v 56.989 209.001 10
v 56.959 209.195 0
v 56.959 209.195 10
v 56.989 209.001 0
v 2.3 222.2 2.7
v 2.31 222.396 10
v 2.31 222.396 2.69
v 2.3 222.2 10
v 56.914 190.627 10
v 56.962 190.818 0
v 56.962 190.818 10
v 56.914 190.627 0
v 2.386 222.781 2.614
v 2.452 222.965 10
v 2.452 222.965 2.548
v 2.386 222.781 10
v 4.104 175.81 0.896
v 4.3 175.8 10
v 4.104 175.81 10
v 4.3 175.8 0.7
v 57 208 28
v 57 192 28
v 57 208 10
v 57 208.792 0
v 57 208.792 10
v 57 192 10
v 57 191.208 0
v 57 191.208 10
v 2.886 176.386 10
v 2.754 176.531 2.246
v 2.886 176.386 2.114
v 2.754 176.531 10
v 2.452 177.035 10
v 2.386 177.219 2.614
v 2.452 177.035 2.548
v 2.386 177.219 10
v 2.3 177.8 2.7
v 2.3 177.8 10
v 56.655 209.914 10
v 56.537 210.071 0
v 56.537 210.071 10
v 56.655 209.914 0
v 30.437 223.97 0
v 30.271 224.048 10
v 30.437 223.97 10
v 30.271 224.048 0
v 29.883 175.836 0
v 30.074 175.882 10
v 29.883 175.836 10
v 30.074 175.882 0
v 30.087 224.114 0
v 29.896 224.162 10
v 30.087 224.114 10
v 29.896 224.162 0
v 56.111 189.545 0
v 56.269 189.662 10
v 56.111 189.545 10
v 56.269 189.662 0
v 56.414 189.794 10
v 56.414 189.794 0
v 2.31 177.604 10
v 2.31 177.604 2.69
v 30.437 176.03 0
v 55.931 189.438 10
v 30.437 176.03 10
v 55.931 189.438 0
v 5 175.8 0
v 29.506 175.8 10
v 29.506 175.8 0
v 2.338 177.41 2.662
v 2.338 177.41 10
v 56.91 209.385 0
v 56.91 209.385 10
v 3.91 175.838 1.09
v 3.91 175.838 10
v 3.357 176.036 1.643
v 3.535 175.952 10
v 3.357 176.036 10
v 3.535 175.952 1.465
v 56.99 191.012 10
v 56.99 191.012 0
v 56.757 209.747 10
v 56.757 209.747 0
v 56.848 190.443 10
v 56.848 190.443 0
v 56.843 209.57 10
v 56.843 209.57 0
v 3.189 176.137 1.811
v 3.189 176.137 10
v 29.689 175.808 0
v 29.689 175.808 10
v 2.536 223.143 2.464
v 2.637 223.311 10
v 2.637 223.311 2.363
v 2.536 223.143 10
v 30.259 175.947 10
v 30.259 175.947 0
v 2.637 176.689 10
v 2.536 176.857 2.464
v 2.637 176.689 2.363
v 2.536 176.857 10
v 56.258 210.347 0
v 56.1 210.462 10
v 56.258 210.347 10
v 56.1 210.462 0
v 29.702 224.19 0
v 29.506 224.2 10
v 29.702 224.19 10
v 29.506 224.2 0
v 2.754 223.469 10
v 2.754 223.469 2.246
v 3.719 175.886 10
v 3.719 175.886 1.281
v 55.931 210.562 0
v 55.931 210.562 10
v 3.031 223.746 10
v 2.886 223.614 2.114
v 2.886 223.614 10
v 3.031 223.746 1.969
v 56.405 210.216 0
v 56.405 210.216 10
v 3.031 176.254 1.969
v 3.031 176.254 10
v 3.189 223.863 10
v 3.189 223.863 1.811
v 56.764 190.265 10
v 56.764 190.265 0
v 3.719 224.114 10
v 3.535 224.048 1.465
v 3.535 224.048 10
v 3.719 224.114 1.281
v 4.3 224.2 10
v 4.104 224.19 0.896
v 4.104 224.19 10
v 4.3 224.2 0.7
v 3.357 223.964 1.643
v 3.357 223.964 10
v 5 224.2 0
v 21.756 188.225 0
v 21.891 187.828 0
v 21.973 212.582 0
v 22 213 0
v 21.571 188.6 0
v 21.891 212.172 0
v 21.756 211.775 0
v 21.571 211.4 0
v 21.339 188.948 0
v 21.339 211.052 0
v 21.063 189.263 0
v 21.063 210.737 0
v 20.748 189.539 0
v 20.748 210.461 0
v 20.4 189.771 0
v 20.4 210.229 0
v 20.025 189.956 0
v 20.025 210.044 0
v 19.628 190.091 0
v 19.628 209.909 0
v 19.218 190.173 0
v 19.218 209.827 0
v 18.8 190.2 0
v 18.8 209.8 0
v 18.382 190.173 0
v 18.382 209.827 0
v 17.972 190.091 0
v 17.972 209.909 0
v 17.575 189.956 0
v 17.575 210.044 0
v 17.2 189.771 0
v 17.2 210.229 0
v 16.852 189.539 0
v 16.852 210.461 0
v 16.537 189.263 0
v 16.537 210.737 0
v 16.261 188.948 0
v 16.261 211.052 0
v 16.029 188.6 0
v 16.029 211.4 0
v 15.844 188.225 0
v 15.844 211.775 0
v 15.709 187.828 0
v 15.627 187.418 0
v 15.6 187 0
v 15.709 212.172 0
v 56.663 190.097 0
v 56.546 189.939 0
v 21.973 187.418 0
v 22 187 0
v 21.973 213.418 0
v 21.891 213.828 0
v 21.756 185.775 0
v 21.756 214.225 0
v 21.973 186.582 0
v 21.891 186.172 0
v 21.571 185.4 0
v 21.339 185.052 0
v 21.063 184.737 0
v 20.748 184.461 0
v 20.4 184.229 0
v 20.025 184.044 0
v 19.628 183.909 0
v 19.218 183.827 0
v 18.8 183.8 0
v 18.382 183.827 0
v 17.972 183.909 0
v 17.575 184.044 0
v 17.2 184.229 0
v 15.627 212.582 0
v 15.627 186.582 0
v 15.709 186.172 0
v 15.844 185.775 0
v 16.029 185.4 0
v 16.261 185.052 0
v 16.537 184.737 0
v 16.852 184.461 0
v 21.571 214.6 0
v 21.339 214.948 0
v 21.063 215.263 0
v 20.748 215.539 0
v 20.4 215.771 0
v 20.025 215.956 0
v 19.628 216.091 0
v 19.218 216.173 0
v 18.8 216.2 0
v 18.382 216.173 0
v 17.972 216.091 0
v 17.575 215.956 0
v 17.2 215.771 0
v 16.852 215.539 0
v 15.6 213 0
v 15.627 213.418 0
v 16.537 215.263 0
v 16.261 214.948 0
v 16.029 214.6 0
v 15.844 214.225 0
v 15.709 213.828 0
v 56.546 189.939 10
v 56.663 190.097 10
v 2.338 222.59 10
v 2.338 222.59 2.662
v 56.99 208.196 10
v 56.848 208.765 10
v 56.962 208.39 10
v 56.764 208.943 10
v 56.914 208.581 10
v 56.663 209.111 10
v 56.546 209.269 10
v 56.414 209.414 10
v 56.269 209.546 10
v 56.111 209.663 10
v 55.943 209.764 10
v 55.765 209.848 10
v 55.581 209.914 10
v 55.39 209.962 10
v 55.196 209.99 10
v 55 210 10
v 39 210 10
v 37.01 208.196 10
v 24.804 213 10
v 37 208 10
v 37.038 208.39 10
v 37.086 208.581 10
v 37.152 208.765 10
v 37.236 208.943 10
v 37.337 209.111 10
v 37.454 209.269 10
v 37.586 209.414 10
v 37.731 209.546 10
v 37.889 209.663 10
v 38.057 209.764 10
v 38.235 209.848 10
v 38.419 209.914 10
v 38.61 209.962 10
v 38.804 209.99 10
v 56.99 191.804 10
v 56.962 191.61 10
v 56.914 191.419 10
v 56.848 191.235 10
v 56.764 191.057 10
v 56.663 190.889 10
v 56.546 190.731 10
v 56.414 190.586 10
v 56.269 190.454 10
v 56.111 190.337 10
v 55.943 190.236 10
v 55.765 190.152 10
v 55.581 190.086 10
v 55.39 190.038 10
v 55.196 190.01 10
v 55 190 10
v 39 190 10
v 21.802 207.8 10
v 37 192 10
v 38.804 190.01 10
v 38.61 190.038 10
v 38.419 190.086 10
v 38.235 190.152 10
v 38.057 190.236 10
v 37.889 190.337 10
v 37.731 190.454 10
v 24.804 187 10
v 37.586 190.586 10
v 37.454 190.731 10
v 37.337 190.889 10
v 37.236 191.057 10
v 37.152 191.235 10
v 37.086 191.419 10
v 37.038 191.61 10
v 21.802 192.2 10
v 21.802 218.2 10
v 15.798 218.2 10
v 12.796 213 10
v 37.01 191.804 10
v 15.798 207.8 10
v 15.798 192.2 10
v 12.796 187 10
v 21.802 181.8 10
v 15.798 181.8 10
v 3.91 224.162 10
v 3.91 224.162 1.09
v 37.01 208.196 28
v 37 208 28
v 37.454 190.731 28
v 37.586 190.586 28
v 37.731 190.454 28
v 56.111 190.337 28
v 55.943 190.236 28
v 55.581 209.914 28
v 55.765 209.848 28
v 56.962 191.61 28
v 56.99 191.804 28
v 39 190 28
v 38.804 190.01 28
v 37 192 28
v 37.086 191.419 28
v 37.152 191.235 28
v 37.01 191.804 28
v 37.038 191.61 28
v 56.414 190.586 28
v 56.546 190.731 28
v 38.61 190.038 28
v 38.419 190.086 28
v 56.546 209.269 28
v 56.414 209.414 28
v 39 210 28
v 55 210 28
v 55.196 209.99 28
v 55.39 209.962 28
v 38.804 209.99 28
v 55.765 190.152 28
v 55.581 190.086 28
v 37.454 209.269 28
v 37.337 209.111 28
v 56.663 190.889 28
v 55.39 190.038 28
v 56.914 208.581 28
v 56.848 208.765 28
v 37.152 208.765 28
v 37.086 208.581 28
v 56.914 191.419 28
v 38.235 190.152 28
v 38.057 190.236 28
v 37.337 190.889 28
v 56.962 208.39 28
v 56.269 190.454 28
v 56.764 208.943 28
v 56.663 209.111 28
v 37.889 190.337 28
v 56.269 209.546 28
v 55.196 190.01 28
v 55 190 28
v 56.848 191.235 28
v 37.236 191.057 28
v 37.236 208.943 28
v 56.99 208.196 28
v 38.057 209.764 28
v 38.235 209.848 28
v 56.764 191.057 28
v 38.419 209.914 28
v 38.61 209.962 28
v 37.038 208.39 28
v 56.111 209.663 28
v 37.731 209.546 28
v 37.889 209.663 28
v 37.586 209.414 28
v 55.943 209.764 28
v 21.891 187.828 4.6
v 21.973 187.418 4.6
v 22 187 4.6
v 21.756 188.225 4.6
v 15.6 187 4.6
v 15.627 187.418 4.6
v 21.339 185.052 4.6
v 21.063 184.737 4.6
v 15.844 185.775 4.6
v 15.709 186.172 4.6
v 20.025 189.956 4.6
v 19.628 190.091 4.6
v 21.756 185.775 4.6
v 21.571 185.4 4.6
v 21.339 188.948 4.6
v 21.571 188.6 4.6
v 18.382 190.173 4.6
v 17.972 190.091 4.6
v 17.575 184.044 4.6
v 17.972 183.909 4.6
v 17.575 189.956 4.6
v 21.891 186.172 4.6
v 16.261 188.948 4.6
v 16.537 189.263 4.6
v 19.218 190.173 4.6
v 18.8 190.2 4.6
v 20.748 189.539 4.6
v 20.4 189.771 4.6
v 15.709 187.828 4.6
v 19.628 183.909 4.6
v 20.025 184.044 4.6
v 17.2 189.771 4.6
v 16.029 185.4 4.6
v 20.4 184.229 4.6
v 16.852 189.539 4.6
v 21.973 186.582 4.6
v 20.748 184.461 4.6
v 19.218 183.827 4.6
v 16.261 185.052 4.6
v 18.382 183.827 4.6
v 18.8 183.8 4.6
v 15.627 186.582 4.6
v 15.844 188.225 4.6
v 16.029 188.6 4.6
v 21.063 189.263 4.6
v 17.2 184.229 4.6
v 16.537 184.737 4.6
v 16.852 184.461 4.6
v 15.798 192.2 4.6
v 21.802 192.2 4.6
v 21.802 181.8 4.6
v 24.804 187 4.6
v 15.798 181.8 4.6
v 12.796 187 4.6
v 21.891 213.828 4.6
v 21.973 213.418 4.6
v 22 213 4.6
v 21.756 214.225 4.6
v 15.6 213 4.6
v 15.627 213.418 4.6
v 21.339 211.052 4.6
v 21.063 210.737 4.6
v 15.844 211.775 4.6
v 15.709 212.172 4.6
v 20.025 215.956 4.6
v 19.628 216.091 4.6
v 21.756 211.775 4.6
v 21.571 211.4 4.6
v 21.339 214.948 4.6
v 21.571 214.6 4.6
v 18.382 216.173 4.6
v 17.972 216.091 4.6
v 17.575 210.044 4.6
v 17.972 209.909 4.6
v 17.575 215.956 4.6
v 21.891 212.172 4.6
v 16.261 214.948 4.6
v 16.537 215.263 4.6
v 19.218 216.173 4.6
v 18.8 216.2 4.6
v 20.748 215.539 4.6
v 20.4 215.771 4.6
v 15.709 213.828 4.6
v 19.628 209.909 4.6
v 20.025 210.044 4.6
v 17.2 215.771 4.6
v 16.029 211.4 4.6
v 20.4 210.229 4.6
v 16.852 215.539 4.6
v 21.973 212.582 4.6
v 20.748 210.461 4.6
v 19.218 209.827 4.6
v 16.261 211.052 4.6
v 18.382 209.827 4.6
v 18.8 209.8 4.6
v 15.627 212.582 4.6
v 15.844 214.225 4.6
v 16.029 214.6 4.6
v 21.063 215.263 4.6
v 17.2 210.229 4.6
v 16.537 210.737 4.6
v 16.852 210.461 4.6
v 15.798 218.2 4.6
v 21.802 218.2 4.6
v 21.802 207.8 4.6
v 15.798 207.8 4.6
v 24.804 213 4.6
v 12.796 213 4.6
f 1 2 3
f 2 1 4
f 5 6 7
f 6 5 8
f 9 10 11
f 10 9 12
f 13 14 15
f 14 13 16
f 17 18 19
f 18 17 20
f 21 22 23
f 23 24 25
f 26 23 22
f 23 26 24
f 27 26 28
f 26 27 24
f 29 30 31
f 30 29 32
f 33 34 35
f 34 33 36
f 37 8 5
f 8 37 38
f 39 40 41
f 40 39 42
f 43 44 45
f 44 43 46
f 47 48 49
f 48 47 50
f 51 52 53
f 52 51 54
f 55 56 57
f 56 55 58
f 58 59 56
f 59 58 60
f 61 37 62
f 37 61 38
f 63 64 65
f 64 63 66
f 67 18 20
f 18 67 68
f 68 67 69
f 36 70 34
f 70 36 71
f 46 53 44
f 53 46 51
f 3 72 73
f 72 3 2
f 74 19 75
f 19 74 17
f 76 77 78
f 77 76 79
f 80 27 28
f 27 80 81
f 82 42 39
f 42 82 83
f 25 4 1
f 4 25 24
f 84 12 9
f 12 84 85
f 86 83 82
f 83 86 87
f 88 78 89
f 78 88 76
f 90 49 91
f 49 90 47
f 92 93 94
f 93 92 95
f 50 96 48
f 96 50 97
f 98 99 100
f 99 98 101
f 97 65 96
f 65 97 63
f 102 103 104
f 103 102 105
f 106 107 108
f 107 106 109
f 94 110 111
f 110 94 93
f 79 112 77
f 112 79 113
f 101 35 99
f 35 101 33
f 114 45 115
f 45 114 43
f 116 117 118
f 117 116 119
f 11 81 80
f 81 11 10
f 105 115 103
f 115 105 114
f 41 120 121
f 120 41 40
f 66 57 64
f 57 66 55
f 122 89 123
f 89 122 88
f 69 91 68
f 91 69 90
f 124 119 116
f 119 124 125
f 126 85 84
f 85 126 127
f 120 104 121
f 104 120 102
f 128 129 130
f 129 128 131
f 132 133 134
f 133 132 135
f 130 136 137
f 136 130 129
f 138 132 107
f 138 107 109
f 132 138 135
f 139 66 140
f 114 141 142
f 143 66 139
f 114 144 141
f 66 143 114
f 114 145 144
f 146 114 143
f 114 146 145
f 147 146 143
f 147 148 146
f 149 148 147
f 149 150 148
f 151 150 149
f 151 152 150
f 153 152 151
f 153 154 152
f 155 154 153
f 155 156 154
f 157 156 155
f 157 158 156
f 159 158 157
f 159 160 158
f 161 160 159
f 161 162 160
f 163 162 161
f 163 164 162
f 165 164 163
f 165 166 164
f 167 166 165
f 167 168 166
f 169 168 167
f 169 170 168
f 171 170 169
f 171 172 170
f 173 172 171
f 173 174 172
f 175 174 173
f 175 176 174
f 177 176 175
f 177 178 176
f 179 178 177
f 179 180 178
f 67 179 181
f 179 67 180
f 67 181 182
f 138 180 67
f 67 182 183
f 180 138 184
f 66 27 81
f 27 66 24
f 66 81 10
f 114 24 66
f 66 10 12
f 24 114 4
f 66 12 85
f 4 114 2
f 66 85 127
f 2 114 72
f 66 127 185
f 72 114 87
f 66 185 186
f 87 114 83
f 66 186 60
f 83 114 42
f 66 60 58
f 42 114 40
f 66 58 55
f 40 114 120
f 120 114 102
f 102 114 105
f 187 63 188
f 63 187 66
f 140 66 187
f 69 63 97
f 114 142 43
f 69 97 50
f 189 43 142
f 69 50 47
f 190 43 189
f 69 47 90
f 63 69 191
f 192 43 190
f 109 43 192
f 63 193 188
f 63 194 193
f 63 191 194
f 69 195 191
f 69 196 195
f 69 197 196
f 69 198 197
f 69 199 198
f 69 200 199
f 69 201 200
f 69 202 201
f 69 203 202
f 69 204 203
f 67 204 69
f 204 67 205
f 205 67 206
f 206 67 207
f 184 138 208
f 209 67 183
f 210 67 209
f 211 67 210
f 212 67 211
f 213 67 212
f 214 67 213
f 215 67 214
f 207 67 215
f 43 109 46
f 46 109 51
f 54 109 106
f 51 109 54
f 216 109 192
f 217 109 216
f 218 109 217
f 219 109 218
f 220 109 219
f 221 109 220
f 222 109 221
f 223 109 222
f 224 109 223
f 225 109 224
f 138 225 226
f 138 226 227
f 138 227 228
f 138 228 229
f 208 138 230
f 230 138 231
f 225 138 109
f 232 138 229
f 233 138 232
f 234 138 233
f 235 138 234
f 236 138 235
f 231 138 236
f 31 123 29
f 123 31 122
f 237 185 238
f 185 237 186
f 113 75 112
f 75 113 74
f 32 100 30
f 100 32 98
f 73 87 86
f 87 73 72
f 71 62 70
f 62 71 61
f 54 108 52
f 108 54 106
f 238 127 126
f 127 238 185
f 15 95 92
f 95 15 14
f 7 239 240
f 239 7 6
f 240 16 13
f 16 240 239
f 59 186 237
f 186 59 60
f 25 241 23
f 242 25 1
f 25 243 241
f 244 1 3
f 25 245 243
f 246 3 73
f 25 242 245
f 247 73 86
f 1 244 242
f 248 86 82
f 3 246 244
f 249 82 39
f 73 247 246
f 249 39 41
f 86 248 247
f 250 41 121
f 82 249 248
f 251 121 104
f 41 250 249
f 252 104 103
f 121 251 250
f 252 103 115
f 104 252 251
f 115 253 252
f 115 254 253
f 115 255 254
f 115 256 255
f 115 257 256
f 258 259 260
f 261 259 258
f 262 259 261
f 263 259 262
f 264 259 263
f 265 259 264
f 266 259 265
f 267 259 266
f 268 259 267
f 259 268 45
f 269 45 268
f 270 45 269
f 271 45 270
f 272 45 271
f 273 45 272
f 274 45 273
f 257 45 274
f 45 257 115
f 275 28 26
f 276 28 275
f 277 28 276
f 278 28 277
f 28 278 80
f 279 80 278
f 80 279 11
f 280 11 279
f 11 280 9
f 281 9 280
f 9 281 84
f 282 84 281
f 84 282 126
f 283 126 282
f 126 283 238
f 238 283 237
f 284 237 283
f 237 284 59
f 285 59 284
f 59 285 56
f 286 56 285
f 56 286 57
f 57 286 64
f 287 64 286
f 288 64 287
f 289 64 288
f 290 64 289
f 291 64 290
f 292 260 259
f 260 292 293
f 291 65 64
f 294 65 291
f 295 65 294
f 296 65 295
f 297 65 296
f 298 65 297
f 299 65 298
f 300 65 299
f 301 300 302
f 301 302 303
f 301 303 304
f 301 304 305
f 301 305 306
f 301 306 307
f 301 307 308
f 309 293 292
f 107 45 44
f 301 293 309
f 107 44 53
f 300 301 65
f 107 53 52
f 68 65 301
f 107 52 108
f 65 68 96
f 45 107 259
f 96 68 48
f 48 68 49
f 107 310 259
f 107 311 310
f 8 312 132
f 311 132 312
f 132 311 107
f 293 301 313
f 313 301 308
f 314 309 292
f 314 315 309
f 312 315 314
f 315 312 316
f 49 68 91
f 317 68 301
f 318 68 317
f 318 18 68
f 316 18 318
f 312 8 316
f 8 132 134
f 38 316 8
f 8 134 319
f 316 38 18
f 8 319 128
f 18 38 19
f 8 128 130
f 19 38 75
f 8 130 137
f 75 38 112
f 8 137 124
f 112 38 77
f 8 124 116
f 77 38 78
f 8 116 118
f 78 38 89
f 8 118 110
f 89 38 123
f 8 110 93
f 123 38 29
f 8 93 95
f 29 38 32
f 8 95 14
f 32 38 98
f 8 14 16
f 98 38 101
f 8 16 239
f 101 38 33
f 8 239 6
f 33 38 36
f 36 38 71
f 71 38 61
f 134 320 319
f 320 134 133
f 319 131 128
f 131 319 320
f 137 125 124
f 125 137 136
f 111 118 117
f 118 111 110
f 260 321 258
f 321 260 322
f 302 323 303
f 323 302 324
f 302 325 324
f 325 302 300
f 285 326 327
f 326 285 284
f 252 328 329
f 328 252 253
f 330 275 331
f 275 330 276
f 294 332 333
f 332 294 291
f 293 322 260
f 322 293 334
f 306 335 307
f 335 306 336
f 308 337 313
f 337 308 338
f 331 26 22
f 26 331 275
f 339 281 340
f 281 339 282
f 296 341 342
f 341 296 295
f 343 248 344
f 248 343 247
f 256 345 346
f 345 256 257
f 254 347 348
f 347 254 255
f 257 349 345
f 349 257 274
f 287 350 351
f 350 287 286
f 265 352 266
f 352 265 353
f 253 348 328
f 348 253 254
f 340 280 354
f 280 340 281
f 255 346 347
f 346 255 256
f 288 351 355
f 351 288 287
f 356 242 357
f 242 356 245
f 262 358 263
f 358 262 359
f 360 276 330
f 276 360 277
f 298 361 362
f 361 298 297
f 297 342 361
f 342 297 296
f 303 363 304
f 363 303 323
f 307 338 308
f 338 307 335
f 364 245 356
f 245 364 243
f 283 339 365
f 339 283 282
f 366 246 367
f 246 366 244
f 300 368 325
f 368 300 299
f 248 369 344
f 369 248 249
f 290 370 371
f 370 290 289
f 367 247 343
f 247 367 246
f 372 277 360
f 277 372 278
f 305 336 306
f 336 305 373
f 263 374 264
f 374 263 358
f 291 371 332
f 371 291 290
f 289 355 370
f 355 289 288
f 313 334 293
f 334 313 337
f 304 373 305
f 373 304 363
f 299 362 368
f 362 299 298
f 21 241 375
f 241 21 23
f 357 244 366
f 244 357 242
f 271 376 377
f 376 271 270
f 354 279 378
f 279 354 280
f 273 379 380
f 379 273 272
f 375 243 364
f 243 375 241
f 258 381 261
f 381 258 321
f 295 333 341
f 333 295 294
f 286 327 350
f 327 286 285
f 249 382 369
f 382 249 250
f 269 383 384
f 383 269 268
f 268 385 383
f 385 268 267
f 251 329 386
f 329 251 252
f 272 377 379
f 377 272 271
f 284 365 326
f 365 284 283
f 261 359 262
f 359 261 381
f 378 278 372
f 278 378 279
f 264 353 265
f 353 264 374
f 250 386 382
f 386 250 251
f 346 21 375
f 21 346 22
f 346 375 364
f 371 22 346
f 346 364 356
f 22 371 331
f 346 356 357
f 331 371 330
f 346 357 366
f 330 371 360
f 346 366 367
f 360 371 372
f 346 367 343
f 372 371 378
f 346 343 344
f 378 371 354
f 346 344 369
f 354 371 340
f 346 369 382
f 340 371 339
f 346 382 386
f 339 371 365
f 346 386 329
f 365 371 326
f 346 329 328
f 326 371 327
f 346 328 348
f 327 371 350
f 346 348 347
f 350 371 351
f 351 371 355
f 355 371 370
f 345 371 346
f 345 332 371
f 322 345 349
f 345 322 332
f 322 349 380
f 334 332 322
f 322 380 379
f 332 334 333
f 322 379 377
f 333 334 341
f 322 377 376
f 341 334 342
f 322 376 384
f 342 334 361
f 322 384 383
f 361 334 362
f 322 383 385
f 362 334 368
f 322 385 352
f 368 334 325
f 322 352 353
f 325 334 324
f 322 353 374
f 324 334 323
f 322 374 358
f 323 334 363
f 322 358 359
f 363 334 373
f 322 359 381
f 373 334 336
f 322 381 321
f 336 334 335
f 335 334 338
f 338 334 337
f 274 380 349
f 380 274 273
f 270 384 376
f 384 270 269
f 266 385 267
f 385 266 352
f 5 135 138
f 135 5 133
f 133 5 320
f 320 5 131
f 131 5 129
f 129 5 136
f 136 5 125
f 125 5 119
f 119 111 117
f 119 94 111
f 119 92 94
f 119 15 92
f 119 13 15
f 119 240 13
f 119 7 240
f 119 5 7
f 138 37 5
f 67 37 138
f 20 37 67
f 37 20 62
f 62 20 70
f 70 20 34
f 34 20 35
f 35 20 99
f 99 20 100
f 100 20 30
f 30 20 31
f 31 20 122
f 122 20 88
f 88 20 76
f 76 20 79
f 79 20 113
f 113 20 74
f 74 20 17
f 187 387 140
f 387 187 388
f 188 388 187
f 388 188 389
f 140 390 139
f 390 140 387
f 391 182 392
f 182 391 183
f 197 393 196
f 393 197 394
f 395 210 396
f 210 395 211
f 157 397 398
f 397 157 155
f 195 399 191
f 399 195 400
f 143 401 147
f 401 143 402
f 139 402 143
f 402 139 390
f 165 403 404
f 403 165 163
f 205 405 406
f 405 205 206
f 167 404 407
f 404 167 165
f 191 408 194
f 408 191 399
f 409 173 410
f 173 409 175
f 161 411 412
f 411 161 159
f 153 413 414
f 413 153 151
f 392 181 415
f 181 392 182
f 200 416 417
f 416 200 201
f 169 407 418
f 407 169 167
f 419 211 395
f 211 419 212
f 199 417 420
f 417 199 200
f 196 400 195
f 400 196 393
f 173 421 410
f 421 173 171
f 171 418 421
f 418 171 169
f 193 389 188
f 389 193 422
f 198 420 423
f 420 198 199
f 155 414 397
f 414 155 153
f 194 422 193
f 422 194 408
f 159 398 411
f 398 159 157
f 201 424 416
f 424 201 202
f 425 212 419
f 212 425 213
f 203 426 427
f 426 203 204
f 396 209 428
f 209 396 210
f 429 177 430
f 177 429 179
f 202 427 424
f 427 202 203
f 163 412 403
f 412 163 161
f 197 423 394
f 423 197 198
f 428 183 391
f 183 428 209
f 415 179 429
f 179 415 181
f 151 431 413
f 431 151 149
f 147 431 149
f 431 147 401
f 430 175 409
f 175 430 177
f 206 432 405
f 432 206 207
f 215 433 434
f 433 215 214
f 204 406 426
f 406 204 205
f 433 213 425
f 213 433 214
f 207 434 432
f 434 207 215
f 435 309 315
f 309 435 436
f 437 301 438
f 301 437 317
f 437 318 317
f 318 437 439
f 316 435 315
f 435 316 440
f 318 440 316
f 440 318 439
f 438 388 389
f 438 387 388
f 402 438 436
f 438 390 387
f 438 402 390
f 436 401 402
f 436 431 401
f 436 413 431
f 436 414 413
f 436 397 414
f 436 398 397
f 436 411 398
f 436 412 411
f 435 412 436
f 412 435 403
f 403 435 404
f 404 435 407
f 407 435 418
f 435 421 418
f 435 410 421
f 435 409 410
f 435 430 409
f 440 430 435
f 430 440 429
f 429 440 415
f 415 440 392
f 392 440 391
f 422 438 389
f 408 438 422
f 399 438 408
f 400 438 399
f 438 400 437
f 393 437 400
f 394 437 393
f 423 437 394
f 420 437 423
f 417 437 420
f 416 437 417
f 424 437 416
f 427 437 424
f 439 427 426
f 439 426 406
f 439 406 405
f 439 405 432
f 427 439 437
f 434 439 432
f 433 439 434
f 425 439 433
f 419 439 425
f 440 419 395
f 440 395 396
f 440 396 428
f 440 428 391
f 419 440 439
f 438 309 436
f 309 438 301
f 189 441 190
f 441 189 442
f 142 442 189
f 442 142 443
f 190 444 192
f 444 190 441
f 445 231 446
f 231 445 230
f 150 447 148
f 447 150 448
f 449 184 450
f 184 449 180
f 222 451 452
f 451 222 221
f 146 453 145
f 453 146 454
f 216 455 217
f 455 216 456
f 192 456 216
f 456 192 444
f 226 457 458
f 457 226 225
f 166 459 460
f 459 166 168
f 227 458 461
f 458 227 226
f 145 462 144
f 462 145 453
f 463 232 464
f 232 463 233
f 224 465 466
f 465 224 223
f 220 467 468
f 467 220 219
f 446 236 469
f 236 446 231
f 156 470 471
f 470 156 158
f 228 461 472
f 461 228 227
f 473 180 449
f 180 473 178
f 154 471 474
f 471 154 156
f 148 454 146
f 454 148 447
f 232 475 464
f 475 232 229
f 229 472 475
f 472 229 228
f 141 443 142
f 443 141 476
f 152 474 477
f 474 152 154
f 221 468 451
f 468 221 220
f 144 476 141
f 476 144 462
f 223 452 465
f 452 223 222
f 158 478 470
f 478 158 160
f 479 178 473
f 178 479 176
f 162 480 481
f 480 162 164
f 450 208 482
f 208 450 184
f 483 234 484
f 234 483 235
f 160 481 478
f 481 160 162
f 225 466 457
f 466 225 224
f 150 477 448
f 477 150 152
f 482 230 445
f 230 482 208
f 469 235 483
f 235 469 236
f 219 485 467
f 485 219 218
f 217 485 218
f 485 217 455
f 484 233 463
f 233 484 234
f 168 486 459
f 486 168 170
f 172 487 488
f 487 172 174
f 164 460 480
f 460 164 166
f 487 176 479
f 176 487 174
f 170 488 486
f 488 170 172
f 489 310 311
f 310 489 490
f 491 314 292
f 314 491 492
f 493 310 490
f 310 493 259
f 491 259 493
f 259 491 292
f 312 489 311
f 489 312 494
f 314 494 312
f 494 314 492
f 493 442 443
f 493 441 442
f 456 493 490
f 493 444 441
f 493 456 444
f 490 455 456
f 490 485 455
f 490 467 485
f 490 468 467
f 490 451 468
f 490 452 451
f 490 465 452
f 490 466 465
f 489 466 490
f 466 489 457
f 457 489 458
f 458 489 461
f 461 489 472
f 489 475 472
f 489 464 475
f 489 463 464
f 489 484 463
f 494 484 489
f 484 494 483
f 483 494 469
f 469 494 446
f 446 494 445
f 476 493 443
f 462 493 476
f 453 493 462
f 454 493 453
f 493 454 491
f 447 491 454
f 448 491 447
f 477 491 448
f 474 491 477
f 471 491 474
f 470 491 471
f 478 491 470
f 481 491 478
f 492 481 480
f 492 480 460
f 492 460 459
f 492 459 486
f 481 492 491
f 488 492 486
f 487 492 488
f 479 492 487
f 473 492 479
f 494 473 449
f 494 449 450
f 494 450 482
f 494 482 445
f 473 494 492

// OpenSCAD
// file: ../../../../modules/steel_rack.scad
use <bolts.scad>;

bolt_edge_offset = 15;
bolt_positions = [
  bolt_edge_offset,
  bolt_edge_offset + 98,
  bolt_edge_offset + 98 + 24,
];

module bolt_and_nut(y, h) {
  nut_thickness = 5;
  translate([0, y, h / 2])
    m6_bolt_hole(h + 1, center = true);
  translate([0, y, h - nut_thickness / 2])
    rotate([0, 0, 90])
    m6_nut_trap(nut_thickness, center = true);
}

module long_bar(w, y, h) {
  difference() {
    translate([w / 2, y / 2, h / 2])
      cube([w, y, h], center = true);

    for (x = bolt_positions) {
      translate([x, 0, 0])
        bolt_and_nut(y / 2, h);
    }
  }
}

module short_bar(w, y, h) {
  difference() {
    translate([w / 2, y / 2, h / 2])
      cube([w, y, h], center = true);

    translate([bolt_positions[0], 0, 0])
      bolt_and_nut(y / 2, h);
  }
}

module fillet_profile(r, h) {
  linear_extrude(height = h, center = true)
    difference() {
      square([r, r]);
      circle(r = r, $fn = 64);
    }
}
// file: ../../../../modules/slide_rail_outer_bracket.scad
use <bolts.scad>
use <steel_rack.scad>

// スライドレール外側とL字アングルを接合するL字ブラケット。
// 設計の経緯と確定値は ledger/designs/steel-rack-500x400.md が正本。
//
// 座標系 (部品自身の datum):
//   X = 0 がこの部品側のL字アングル外側面。部品はアングル板厚の内側から始まる
//   Y = 0 がスライドレール外側面。+Y がラック外側
//   Z = 0 が部品底面 (レール下端と一致)
// front は screw_x = [37, 101.5]、rear は [79.5, 176] を自分の datum
// から渡す。 M6 が高さ 22.5±12 の対称配置のため部品は Z 反転対称になり、
// 左右のレールにも上下反転するだけで同じ2部品を使い回せる。

bracket_height = 45;
flange_t = 10; // 短辺 (X方向厚) の厚さ
// 長辺 (Y方向厚) の厚さ。旧断面は flange_t=10 を共用していたが、レール面を
// rail_offset 分外へ出すと M6 ナット挿入口が長辺と重なるため 2mm 削った
// (10→8、user決定)。ナット六角の内縁 (y=8.000) と長辺外面がツライチになる
arm_t = 8;
// レール接触面のラック外側オフセット。組付け実測でレール間隔が 385mm しか
// なくケース 412mm が入らないため、(412 - 385) / 2 + 0.5 = 14mm ずつ
// 各レールを外側へ移す (user指示)。M6 実穴は既に開いており位置を変えられない
rail_offset = 14;
inner_r = 4;
m6_z = [ 10.5, 34.5 ];
// クリアランス基準: 呼び寸法 + 0.4mm (実プリントの嵌合結果から拡大)
m6_pass_flat = 6.4; // M6ボルト通し六角の二面幅 (手前5mm)
m6_nut_flat = 10.4; // M6ナット窪み六角の二面幅 (奥5mm、ナット実測9.8 + 実効0.6)
m6_stage_depth = 5;
screw_z = 22.5;
m4_pass_flat = 4.4; // M4小トラスネジ通し六角の二面幅
m4_nut_flat = 7.4; // M4ナット窪み六角の二面幅 (ナット実測6.8 + 実効0.6)
m4_nut_depth = 2.8; // M4ナット窪みの深さ (user指定)
edge_margin = 8; // 穴の外縁から部品端までの余白 (自由な辺のみ)
angle_t = 2.2; // L字アングルの板厚

// 六角プリズム: 軸X・上下の辺が水平 (flat-up)。
// 天井を短い水平ブリッジにして垂れの改善を狙う
// (point-up だと天井面が水平から30°になり垂れた — 嵌合試験で確認済み)
module
hex_x_flat_up(flat_d, l)
{
    rotate([ 0, 90, 0 ]) rotate([ 0, 0, 90 ]) hex_hole(flat_d = flat_d, h = l);
}

// 六角プリズム: 軸Y・上下の辺が水平 (flat-up)。M6と同じくブリッジ天井
module
hex_y_flat_up(flat_d, l)
{
    rotate([ 90, 0, 0 ]) hex_hole(flat_d = flat_d, h = l);
}

module
slide_rail_outer_bracket(screw_x, name = "bracket")
{
    // flat-up配置では水平方向の穴半径は対角/2 (= 二面幅/(2*cos30))。
    // 8mm余白の契約はこの実半径に対して守る
    m6_nut_diag = m6_nut_flat / cos(30);
    m4_nut_diag = m4_nut_flat / cos(30);
    // M6中心: 実物のアングルには旧断面 (長辺厚10) の導出値
    // (厚10 + 内側R + 余白 + M6六角対角/2 = 28.0044) で既に穴が開いている。
    // 旧導出式から rail_offset を引くことで M6 実穴と部品外端の絶対位置を
    // 保ったまま、レール接触面 (y=0) だけをラック外側へ 14mm 出す
    m6_y = flange_t + inner_r + edge_margin + m6_nut_diag / 2 - rail_offset;
    short_len = m6_y + m6_nut_diag / 2 + edge_margin;
    // 長辺のX終端: 最奥のM4穴の最大断面 (ナット窪みの対角の半分) + 余白
    arm_end = max(screw_x) + m4_nut_diag / 2 + edge_margin;

    echo(str("CONTRACT ", name, ": height = ", bracket_height));
    echo(str("CONTRACT ", name, ": flange_t = ", flange_t));
    echo(str("CONTRACT ", name, ": arm_t = ", arm_t));
    echo(str("CONTRACT ", name, ": rail_offset = ", rail_offset));
    echo(str("CONTRACT ", name, ": inner_r = ", inner_r));
    echo(str("CONTRACT ", name, ": m6_z = ", m6_z));
    echo(str("CONTRACT ", name, ": m6_pass_flat = ", m6_pass_flat));
    echo(str("CONTRACT ", name, ": m6_nut_flat = ", m6_nut_flat));
    echo(str("CONTRACT ", name, ": screw_z = ", screw_z));
    echo(str("CONTRACT ", name, ": m4_pass_flat = ", m4_pass_flat));
    echo(str("CONTRACT ", name, ": m4_nut_flat = ", m4_nut_flat));
    echo(str("CONTRACT ", name, ": m4_nut_depth = ", m4_nut_depth));
    echo(str("CONTRACT ", name, ": edge_margin = ", edge_margin));
    echo(str("CONTRACT ", name, ": angle_t = ", angle_t));
    echo(str("CONTRACT ", name, ": screw_x = ", screw_x));
    echo(str("CONTRACT ",
             name,
             ": m6_y = ",
             m6_y,
             ", short_len = ",
             short_len,
             ", arm_end = ",
             arm_end));

    // 余白の契約 (自由な辺のみ。高さ45とM6のZはuser固定値なので対象外)。
    // M6ナット六角の内縁 (m6_y - 対角/2 = 8.000) は長辺外面 (y = arm_t) と
    // ツライチで、ナット挿入口が長辺に塞がれない (1e-9 は浮動小数の丸め猶予)
    assert(m6_y - m6_nut_diag / 2 >= arm_t - 1e-9,
           "M6 nut slot is blocked by the arm");
    assert(short_len - (m6_y + m6_nut_diag / 2) >= edge_margin,
           "M6 hole too close to the short-flange edge");
    assert(arm_end - (max(screw_x) + m4_nut_diag / 2) >= edge_margin,
           "M4 hole too close to the arm end");
    assert(min(screw_x) - m4_nut_diag / 2 >= angle_t + flange_t,
           "M4 hole overlaps the short flange");

    difference()
    {
        union()
        {
            // 短辺: アングル内側に当たる縦板 (M6で締結)
            translate([ angle_t, 0, 0 ])
                cube([ flange_t, short_len, bracket_height ]);

            // 長辺: レール外側面に当たる横板 (M4小トラスネジ+ナットで締結)
            translate([ angle_t, 0, 0 ])
                cube([ arm_end - angle_t, arm_t, bracket_height ]);

            // 内側コーナーのR4フィレット (応力集中の回避)
            translate([
                angle_t + flange_t + inner_r,
                arm_t + inner_r,
                bracket_height / 2
            ]) rotate([ 0, 0, 180 ]) fillet_profile(inner_r, bracket_height);
        }

        // M6の2段六角穴 (軸X・flat-up): 手前5mmが通し、奥5mmがナット窪み。
        // ナット窪みは +X へ延長した挿入回廊 (x=7.2..17): 短辺の背面から
        // fillet の掛かる区間を局所カットし、fillet 外端 (x=16.2) を 0.8mm
        // 超えて開放することで M6 ナットを +X 側から真っ直ぐ挿入できる
        // (fillet と挿入経路の干渉分を削るのは user 許容)。
        // 六角の下頂点 (y=8.000) は長辺外面とツライチで、正確な接触は
        // 退化した稜 (非多様体STL) を作るため、hull で 0.2mm 下へ掃引して
        // 長辺外面に浅い逃げ溝を彫る (ナットの嵌合には影響しない)
        slot_start = angle_t + flange_t - m6_stage_depth;
        slot_end = angle_t + flange_t + inner_r + 0.8;
        slot_relief = 0.2;
        for (z = m6_z) {
            translate([ angle_t + m6_stage_depth / 2 - 0.05, m6_y, z ])
                hex_x_flat_up(m6_pass_flat, m6_stage_depth + 0.1);
            translate([ (slot_start + slot_end) / 2, m6_y, z ]) hull()
            {
                hex_x_flat_up(m6_nut_flat, slot_end - slot_start);
                translate([ 0, -slot_relief, 0 ])
                    hex_x_flat_up(m6_nut_flat, slot_end - slot_start);
            }
        }

        // M4小トラスネジの穴 (軸Y・flat-up):
        // 通しは全厚を貫通し、L字の内側面 (y=8) から深さ2.8mmのナット窪み。
        // ネジはレール内側から刺さり
        // (トラス頭はスライダーと干渉しない実測済み)、
        // ナットが窪みの底で受けてレール板とブラケットを共締めする
        for (x = screw_x) {
            translate([ x, arm_t / 2, screw_z ])
                hex_y_flat_up(m4_pass_flat, arm_t + 0.2);
            translate([ x, arm_t - m4_nut_depth / 2 + 0.05, screw_z ])
                hex_y_flat_up(m4_nut_flat, m4_nut_depth + 0.1);
        }
    }
}
// file: ../../../../modules/bolts.scad
module nut_trap(d, h, center = true) {
  linear_extrude(height = h, center = center)
  circle(d = d / cos(30), $fn = 6);
}

module bolt_hole(d, h, center = true) {
  linear_extrude(height = h, center = center)
  circle(d = d, $fn = 64);
}

// Hex holes for self-tapping (nominal - 0.2mm)
module hex_hole(flat_d, h) {
  linear_extrude(height = h, center = true)
  circle(d = flat_d / cos(30), $fn = 6);
}

module m3_bolt_hexhole(h) {
  rotate([0, 0, 90]) hex_hole(flat_d = 2.8, h = h);
}

module m4_bolt_hexhole(h) {
  rotate([0, 0, 90]) hex_hole(flat_d = 3.8, h = h);
}

module m6_bolt_hexhole(h) {
  rotate([0, 0, 90]) hex_hole(flat_d = 5.8, h = h);
}

module m8_bolt_hexhole(h) {
  rotate([0, 0, 90]) hex_hole(flat_d = 7.8, h = h);
}

// M3
module m3_bolt_hole(h, center = false) { bolt_hole(d = 3.4, h = h, center = center); }
module m3_nut_trap(h, center = false) { nut_trap(d = 5.7, h = h, center = center); }

// M4
module m4_bolt_hole(h, center = false) { bolt_hole(d = 4.4, h = h, center = center); }
module m4_nut_trap(h, center = false) { nut_trap(d = 7.5, h = h, center = center); }

// M6
module m6_bolt_hole(h, center = false) { bolt_hole(d = 6.2, h = h, center = center); }
module m6_nut_trap(h, center = false) { nut_trap(d = 10.2, h = h, center = center); }

// M8
module m8_bolt_hole(h, center = false) { bolt_hole(d = 8.4, h = h, center = center); }
module m8_nut_trap(h, center = false) { nut_trap(d = 13.3, h = h, center = center); }
// main file
use <../../../../modules/shelf_frame.scad>

// ケース棚の辺の支え。左右の30cm材の中央用。
shelf_frame_flat_print() shelf_frame_mid_side();
